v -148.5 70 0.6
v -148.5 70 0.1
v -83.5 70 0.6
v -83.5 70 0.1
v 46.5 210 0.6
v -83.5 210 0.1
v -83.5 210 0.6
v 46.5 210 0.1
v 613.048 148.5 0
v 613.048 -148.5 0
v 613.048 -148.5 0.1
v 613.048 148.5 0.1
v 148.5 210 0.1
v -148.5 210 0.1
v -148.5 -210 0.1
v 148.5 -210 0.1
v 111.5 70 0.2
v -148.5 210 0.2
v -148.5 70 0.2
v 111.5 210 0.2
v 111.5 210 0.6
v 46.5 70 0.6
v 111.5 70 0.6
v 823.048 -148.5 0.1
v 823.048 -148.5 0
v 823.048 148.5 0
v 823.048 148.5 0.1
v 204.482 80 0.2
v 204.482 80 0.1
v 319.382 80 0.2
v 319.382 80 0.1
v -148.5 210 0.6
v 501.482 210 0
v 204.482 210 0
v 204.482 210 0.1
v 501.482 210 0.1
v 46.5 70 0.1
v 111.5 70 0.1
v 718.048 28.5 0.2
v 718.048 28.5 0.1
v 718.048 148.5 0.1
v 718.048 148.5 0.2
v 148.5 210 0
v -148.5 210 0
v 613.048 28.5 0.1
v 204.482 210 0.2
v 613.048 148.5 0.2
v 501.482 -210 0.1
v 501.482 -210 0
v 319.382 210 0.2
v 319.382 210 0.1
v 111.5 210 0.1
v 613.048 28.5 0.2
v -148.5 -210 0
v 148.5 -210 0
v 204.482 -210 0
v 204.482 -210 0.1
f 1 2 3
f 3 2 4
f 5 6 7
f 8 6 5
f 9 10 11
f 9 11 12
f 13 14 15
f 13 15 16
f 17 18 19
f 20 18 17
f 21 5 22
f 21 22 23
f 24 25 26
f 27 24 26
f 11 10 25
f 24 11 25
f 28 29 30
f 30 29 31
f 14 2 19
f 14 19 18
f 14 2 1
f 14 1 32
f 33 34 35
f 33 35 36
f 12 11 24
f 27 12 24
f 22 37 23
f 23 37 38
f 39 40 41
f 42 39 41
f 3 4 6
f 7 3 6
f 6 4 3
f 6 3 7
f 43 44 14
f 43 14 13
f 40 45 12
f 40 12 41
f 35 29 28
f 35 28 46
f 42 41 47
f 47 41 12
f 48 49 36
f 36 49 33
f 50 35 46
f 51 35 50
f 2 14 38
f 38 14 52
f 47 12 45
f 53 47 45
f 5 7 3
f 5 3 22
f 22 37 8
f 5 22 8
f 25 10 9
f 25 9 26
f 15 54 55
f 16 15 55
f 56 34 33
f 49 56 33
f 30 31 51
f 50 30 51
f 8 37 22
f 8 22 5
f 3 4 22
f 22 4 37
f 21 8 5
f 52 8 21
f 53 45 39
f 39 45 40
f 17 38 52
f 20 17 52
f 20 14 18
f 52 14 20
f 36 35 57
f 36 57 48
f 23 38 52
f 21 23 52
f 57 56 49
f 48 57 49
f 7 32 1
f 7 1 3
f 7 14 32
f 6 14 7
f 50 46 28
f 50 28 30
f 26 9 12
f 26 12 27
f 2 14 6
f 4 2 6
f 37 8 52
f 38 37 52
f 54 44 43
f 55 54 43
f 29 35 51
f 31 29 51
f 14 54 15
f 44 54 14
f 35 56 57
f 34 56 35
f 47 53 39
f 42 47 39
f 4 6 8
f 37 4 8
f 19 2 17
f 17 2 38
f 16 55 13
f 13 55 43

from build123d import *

# Parameters (mm, degrees)
F0_W     = 297
F0_H     = 420
F0_W_2   = 210
F0_H_2   = 297
F1_DEPTH = 0.1
F2_W     = 260
F2_H     = 140
F3_DEPTH = 0.1
F4_W     = 65
F4_H     = 140
F5_DEPTH = 0.5
F4_W_2   = 130
F6_DEPTH = 0.5
F7_DEPTH = 0.5
F2_W_2   = 114.9
F2_H_2   = 130
F8_DEPTH = 0.1
F9_DEPTH = 0.1


with BuildPart() as f1:
    # F0 (on Top) → F1 (new body)
    with BuildSketch(Plane.XY):
        Rectangle(F0_W, F0_H)
        with Locations((352.981538, 0)):
            Rectangle(F0_W, F0_H)
        with Locations((718.048334, 0)):
            Rectangle(F0_W_2, F0_H_2)
    extrude(amount=F1_DEPTH)


with BuildPart() as f3:
    # F2 (on face) → F3 (new body)
    with BuildSketch(Plane.XY.offset(0.1)):
        with Locations((-18.5, 140)):
            Rectangle(F2_W, F2_H)
    extrude(amount=F3_DEPTH)


with BuildPart() as f5:
    # F4 (on face) → F5 (new body)
    with BuildSketch(Plane.XY.offset(0.1)):
        with Locations((-116, 140)):
            Rectangle(F4_W, F4_H)
    extrude(amount=F5_DEPTH)


with BuildPart() as f6:
    # F4 (on face) → F6 (new body)
    with BuildSketch(Plane.XY.offset(0.1)):
        with Locations((-18.5, 140)):
            Rectangle(F4_W_2, F4_H)
    extrude(amount=F6_DEPTH)


with BuildPart() as f7:
    # F4 (on face) → F7 (new body)
    with BuildSketch(Plane.XY.offset(0.1)):
        with Locations((79, 140)):
            Rectangle(F4_W, F4_H)
    extrude(amount=F7_DEPTH)


with BuildPart() as f8:
    # F2 (on face) → F8 (new body)
    with BuildSketch(Plane.XY.offset(0.1)):
        with Locations((261.931538, 145)):
            Rectangle(F2_W_2, F2_H_2)
    extrude(amount=F8_DEPTH)


with BuildPart() as f9:
    # F4 (on face) → F9 (new body)
    with BuildSketch(Plane.XY.offset(0.1)):
        Polygon((718.048334, 148.5), (613.048334, 148.5), (613.048334, 28.5), (718.000201, 28.5), (718.048334, 28.5), align=None)
    extrude(amount=F9_DEPTH)


solid = Compound([f1.part, f3.part, f5.part, f6.part, f7.part, f8.part, f9.part])
